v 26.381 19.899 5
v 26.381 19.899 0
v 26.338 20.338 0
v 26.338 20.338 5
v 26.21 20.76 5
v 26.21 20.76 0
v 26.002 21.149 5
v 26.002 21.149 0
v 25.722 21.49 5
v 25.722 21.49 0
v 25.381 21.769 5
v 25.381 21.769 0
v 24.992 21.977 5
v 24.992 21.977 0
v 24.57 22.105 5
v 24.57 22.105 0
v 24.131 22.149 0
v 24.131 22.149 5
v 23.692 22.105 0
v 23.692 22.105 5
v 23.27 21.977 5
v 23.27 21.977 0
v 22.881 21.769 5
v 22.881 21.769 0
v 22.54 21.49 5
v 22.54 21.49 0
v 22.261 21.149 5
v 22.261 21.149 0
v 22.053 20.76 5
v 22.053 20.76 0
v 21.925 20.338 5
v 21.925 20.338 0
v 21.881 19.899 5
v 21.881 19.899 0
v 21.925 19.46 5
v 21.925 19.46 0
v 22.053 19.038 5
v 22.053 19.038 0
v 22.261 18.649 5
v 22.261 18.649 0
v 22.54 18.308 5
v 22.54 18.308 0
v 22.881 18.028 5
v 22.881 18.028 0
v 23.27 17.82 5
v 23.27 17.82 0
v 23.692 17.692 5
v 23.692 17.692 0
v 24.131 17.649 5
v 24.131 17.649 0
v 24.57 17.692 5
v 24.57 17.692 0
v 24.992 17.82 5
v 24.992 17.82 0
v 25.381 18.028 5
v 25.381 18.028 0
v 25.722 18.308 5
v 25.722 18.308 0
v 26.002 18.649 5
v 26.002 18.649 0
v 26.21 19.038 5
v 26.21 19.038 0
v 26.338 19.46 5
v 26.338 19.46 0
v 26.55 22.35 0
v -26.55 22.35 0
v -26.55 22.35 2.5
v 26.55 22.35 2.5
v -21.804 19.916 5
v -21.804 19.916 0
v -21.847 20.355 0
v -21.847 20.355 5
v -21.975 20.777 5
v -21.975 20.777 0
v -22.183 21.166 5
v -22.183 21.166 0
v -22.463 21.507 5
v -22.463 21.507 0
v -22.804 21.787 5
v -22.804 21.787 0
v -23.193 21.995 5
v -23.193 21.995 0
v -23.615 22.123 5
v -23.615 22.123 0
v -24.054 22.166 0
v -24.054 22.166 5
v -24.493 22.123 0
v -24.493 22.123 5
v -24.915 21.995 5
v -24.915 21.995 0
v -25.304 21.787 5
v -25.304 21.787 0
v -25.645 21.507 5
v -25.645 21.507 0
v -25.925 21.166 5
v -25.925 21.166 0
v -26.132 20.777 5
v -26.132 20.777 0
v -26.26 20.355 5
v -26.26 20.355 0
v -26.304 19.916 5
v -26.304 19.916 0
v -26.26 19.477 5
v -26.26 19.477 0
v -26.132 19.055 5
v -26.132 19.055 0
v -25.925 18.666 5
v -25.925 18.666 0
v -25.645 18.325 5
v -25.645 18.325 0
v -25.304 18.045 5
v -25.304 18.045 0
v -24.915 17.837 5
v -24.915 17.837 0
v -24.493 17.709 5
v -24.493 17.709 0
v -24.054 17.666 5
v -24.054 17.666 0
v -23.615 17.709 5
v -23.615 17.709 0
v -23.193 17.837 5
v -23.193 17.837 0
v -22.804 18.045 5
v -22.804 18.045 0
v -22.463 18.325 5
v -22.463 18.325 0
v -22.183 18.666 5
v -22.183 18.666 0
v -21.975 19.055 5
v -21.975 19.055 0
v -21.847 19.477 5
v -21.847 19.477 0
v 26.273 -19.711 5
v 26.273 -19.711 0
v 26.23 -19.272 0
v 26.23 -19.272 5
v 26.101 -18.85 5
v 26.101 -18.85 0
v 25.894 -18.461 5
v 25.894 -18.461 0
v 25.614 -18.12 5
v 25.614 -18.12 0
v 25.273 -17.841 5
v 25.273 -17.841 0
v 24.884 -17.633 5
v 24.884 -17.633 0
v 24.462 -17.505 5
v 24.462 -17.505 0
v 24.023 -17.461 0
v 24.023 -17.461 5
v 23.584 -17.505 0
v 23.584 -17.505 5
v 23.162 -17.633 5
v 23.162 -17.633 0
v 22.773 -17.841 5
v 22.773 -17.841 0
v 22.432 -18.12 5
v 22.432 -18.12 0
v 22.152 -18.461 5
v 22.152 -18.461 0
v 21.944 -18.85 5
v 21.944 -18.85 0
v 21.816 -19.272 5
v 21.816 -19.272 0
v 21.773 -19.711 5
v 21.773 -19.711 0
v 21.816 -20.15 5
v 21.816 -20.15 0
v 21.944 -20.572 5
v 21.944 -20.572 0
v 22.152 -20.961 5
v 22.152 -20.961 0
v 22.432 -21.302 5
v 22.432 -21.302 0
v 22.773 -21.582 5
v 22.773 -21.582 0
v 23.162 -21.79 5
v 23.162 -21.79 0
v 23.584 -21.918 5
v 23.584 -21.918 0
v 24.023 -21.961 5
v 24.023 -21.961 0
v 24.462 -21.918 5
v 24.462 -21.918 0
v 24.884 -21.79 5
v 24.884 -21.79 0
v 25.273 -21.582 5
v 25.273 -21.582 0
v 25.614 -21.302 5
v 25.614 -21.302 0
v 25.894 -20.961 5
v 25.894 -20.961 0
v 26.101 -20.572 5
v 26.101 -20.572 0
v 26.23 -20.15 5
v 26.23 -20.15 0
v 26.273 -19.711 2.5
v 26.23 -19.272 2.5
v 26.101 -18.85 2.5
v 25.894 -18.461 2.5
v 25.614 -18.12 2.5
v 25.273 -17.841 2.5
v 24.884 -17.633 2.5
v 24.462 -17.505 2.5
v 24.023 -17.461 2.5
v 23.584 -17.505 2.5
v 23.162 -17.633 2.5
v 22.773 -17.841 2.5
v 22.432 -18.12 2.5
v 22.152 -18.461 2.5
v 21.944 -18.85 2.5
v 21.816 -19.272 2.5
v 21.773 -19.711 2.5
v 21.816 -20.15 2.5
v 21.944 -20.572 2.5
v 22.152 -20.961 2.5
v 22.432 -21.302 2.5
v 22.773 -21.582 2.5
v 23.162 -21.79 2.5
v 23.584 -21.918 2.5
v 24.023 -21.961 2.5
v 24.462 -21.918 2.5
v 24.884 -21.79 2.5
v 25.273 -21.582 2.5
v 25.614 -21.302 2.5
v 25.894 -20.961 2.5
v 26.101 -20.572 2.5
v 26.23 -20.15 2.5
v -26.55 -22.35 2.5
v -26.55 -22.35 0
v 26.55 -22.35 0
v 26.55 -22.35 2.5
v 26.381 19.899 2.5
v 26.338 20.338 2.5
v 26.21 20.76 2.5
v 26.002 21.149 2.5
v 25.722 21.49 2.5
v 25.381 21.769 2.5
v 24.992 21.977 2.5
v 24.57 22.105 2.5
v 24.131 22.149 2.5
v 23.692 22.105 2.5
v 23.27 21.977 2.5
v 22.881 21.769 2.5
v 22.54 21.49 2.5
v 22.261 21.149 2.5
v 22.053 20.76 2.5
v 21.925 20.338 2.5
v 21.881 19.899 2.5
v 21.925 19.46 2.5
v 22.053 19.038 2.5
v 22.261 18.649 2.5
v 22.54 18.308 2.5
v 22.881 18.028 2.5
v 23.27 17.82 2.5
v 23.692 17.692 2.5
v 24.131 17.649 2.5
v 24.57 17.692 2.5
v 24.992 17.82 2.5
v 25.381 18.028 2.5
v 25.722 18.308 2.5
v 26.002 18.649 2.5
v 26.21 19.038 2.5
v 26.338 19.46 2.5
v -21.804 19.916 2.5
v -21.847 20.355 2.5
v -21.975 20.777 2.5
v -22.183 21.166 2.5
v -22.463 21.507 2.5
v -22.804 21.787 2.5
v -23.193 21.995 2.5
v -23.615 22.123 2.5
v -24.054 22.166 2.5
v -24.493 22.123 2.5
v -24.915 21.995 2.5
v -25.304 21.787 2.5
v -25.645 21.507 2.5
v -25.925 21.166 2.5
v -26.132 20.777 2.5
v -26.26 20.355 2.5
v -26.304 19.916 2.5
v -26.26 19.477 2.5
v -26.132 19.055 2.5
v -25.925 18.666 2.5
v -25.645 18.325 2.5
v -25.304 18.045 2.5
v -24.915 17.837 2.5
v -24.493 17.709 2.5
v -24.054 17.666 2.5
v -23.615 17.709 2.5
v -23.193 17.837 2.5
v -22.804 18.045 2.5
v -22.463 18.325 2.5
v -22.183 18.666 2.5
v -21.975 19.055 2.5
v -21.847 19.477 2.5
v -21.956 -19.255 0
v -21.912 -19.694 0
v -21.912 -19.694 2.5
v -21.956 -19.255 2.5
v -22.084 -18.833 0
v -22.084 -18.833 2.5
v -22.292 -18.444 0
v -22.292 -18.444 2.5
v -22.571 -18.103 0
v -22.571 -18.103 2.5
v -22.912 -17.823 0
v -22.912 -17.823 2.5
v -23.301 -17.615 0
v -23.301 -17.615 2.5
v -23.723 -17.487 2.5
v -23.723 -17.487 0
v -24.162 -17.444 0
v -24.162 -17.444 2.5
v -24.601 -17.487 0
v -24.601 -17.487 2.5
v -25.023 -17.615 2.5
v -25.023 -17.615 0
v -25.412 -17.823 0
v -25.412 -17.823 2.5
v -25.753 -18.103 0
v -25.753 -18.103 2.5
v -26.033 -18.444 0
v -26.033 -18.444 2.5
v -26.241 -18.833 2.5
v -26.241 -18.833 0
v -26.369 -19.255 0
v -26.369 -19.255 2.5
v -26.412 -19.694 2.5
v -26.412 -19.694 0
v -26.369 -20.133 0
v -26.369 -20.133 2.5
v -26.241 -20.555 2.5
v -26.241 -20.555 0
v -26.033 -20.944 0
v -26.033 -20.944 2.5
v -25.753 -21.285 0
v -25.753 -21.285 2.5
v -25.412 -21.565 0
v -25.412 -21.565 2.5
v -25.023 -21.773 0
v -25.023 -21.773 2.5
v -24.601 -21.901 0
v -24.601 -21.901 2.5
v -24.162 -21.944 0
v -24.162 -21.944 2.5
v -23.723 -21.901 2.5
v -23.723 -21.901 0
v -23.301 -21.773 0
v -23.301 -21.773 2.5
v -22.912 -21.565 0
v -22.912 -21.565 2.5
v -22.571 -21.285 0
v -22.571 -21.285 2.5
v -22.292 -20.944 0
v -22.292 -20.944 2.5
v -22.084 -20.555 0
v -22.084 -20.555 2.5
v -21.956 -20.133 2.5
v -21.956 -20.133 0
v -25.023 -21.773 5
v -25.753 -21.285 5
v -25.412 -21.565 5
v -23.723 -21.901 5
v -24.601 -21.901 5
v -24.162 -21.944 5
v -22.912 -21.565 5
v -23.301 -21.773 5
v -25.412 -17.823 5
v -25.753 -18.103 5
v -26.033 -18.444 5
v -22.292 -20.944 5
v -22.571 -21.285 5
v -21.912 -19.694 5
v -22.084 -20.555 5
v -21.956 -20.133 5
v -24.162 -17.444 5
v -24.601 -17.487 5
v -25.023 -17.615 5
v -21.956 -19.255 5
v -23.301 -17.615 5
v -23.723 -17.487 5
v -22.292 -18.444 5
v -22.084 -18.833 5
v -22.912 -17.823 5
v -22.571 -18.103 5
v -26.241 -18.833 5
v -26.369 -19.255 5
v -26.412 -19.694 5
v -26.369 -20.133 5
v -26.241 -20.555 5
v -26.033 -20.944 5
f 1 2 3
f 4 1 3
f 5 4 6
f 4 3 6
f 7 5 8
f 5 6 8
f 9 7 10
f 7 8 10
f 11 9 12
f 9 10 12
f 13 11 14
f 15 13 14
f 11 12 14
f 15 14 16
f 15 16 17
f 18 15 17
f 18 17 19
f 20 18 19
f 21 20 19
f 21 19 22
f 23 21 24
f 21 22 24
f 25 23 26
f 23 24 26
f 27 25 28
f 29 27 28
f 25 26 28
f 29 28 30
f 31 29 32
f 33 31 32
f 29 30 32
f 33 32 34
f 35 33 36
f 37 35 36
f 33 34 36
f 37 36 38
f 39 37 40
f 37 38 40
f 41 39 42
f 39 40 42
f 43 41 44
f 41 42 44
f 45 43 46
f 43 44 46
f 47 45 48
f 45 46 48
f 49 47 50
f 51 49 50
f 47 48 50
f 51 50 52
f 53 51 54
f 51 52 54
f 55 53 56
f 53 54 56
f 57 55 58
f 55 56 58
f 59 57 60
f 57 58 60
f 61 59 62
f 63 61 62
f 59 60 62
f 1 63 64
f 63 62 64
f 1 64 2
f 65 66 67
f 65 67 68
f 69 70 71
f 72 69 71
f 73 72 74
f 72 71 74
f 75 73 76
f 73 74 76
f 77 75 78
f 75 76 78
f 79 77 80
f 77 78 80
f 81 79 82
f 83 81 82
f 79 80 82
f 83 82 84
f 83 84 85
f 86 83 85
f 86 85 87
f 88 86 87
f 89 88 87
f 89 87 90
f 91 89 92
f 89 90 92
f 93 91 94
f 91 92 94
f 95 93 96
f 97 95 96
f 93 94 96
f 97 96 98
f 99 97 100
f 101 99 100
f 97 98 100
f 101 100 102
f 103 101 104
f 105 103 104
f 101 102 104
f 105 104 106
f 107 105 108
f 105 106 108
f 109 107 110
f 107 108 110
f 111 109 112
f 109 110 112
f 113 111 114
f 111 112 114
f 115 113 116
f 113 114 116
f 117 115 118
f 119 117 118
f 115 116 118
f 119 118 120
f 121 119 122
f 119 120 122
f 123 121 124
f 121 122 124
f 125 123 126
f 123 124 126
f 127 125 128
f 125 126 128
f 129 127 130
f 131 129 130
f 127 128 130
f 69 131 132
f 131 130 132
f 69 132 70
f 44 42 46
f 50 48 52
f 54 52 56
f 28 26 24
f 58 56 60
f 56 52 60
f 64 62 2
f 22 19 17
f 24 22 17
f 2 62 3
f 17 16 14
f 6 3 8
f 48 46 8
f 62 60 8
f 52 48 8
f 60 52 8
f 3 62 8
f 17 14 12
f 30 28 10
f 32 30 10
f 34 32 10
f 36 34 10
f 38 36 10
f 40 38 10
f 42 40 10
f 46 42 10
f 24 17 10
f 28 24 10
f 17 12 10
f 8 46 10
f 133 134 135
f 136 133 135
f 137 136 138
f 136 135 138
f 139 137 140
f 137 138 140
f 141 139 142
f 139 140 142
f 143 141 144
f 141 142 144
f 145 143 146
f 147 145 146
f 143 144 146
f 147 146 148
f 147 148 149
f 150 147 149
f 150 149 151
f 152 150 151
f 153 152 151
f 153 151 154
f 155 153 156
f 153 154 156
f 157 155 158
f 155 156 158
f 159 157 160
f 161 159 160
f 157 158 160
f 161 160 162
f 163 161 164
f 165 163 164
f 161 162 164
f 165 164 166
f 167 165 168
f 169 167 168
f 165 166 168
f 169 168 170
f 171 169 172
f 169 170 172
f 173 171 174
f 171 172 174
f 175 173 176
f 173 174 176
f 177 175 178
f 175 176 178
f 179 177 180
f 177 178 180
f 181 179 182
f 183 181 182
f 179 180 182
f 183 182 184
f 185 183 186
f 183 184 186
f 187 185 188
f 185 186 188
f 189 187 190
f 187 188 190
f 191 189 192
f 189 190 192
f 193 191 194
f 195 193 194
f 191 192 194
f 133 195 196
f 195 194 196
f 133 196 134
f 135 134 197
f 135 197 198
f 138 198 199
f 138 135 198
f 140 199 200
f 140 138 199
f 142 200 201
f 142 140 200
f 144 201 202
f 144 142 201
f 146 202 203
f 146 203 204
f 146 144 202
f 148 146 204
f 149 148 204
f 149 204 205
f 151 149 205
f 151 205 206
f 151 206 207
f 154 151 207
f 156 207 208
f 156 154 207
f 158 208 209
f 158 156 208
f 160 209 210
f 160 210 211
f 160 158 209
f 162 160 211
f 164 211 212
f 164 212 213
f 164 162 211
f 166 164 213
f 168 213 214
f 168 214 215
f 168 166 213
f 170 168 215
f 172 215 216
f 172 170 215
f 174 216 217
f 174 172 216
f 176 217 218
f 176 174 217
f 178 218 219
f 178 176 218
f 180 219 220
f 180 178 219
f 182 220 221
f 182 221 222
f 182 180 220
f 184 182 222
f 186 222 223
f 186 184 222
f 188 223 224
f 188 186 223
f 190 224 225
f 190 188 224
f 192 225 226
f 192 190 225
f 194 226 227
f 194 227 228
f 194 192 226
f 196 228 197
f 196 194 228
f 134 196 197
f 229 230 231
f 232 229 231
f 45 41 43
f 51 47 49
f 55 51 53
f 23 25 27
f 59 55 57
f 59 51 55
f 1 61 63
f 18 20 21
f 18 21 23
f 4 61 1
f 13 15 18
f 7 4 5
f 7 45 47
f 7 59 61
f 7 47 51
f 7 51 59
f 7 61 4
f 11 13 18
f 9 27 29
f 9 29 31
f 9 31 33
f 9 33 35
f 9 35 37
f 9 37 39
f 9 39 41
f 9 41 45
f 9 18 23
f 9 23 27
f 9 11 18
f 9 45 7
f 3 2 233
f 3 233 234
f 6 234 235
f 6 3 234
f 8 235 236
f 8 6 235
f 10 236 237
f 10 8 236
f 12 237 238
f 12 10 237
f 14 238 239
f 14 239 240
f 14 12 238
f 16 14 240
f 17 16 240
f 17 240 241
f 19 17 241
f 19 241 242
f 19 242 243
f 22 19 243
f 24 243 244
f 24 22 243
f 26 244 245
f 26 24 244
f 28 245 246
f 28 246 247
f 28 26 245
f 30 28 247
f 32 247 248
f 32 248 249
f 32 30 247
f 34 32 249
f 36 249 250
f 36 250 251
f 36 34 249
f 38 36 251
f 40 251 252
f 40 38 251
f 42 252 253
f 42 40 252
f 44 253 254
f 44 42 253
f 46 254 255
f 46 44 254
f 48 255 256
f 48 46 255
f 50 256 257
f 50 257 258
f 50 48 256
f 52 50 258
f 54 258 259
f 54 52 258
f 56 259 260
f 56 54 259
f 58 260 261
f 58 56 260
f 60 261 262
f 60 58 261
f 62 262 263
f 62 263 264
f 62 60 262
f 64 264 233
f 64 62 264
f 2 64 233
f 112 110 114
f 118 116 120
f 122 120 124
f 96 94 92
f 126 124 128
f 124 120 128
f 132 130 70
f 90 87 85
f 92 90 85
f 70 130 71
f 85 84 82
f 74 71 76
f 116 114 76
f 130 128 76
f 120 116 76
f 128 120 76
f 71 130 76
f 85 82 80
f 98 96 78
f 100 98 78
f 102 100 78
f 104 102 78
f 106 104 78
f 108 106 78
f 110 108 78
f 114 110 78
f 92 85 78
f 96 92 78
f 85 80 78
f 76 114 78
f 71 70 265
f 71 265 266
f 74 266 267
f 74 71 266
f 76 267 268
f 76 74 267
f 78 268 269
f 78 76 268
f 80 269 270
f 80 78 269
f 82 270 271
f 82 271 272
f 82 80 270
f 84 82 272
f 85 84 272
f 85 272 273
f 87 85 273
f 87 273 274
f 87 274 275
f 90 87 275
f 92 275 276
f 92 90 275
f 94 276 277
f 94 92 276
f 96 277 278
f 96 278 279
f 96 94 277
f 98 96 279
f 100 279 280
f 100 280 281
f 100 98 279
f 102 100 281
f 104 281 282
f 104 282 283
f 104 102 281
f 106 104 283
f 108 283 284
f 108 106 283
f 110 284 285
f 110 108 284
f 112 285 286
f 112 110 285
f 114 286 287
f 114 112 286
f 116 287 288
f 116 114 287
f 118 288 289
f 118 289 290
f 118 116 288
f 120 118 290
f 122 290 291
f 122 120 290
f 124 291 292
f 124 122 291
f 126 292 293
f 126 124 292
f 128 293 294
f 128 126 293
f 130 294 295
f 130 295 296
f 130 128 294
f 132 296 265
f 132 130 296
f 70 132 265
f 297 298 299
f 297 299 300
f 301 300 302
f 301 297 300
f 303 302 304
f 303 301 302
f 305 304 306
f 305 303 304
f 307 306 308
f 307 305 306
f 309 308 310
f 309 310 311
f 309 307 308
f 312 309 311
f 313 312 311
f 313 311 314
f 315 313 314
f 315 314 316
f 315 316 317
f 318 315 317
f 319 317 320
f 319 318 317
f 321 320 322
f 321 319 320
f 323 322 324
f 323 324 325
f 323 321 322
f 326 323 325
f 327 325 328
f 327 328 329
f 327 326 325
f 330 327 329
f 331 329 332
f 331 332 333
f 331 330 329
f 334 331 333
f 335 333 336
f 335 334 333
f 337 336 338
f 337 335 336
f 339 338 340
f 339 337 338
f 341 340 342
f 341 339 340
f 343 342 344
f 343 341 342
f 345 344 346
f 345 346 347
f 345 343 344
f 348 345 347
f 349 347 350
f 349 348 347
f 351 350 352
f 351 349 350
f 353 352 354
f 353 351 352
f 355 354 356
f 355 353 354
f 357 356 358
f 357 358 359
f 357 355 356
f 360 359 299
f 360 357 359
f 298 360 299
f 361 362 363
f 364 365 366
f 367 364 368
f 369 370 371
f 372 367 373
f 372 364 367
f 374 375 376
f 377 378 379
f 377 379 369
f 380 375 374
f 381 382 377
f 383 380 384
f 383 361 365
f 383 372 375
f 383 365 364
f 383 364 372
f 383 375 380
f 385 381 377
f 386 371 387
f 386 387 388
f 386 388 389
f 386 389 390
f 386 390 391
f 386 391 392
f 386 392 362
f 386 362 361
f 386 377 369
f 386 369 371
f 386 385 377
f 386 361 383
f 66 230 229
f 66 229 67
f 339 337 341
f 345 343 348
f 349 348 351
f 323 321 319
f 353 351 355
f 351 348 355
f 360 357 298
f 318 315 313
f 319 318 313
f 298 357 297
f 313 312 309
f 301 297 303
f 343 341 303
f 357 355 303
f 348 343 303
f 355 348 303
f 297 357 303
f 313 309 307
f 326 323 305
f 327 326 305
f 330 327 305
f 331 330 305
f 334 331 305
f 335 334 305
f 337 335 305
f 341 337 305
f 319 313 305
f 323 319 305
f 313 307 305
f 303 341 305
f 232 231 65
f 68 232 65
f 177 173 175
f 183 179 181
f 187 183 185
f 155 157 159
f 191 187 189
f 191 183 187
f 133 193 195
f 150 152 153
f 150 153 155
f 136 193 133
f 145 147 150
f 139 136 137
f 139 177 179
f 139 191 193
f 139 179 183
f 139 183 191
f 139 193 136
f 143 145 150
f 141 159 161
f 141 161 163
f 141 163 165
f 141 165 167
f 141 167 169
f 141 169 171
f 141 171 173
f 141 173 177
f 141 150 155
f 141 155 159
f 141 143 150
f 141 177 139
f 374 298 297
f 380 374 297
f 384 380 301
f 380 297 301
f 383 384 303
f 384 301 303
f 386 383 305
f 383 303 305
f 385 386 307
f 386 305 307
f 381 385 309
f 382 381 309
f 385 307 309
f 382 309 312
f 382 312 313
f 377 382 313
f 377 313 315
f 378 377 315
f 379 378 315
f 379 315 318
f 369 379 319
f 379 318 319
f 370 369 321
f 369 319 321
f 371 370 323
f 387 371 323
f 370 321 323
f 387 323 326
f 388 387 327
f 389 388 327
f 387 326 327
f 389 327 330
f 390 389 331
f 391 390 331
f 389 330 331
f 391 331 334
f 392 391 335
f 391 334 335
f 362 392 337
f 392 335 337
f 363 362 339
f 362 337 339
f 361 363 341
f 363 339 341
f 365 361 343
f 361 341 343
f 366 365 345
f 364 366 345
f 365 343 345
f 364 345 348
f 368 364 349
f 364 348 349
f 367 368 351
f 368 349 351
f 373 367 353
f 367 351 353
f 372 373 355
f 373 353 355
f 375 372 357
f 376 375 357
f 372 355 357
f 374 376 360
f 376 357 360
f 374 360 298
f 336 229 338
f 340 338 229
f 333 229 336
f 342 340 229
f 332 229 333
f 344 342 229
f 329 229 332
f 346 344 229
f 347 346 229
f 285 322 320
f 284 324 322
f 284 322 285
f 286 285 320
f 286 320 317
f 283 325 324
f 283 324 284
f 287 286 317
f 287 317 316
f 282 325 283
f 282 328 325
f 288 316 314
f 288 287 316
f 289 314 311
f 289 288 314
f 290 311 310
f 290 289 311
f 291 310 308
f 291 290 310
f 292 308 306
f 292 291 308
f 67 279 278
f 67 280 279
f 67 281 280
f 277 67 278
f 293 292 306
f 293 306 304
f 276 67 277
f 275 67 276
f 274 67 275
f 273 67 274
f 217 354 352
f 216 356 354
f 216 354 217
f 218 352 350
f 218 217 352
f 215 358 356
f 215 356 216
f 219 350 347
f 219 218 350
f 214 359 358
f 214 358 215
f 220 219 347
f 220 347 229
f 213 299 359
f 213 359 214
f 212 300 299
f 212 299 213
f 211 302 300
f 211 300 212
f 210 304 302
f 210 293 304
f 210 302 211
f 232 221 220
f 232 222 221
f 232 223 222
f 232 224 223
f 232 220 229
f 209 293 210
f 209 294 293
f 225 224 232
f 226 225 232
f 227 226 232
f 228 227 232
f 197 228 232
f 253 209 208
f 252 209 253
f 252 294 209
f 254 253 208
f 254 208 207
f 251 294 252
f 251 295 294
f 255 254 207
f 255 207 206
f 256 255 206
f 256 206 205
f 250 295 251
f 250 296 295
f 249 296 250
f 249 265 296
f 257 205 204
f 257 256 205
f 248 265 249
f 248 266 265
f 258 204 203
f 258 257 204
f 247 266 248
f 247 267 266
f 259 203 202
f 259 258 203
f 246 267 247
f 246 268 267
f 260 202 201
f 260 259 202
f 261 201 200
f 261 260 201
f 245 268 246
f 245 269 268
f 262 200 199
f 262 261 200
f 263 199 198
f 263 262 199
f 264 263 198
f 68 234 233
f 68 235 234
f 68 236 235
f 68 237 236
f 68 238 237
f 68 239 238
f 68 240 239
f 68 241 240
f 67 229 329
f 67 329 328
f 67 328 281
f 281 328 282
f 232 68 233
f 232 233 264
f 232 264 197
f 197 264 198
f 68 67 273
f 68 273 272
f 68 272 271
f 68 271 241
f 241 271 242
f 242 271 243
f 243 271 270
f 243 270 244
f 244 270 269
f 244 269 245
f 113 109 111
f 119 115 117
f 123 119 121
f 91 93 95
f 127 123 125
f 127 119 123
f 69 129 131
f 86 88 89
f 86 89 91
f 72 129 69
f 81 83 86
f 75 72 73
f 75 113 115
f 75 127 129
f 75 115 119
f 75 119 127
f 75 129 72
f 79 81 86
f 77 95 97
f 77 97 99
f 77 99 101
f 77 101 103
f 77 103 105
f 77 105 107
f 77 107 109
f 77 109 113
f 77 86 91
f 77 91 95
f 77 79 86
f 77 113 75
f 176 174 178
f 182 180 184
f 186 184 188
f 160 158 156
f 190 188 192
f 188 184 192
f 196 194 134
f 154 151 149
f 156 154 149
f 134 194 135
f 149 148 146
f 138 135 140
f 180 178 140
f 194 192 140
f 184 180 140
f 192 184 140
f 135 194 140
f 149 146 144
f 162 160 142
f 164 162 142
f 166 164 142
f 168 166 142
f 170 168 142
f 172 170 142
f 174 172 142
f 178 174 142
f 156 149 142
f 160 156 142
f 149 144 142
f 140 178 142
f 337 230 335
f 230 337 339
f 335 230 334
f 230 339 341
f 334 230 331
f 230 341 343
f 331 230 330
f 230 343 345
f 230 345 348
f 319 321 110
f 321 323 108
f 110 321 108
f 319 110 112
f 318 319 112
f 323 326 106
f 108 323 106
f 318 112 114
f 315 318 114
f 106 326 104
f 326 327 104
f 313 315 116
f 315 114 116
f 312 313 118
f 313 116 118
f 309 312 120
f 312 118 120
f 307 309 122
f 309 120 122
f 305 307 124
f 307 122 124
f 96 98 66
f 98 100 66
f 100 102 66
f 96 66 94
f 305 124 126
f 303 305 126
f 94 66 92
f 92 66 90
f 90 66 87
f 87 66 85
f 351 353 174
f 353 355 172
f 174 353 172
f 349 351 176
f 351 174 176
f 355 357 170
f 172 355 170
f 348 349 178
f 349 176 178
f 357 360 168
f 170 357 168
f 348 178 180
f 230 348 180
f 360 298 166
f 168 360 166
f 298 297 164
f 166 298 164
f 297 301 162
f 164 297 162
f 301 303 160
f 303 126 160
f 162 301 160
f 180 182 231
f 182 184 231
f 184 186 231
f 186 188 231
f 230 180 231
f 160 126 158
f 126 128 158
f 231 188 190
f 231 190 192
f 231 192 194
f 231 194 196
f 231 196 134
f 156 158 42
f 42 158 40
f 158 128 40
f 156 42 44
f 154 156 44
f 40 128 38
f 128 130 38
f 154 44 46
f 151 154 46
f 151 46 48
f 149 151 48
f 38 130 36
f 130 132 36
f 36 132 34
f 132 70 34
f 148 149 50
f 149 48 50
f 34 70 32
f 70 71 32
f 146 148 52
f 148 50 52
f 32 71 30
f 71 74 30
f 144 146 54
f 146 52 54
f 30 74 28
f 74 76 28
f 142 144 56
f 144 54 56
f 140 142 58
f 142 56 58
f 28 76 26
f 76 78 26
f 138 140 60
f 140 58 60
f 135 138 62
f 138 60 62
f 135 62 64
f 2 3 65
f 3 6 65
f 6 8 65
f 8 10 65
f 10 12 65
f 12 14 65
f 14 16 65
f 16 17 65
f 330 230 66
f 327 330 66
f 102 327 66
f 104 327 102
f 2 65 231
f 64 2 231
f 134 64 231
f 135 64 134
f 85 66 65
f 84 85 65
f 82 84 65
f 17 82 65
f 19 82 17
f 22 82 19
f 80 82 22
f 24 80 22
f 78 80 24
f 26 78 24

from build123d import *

# Parameters (mm, degrees)
F0_R     = 2.25
F1_DEPTH = 5
F0_W     = 53.1
F0_H     = 44.7
F2_DEPTH = 2.5


# Not quite as in the source:
# - the program builds the solid bodies; features that only make, move or delete a surface that nothing else refers to are left out


with BuildPart() as f1:
    # F0 (on Top) → F1 (new body)
    with BuildSketch(Plane.XY):
        with Locations((24.1313669831, 19.8986493051)):
            Circle(F0_R)
    extrude(amount=F1_DEPTH)


with BuildPart() as f1b:
    # F0 (on Top) → F1, piece 2 (new body)
    with BuildSketch(Plane.XY):
        with Locations((-24.0537095815, 19.9159570038)):
            Circle(F0_R)
    extrude(amount=F1_DEPTH)


with BuildPart() as f1c:
    # F0 (on Top) → F1, piece 3 (new body)
    with BuildSketch(Plane.XY):
        with Locations((-24.1623297334, -19.694061164)):
            Circle(F0_R)
    extrude(amount=F1_DEPTH)


with BuildPart() as f1d:
    # F0 (on Top) → F1, piece 4 (new body)
    with BuildSketch(Plane.XY):
        with Locations((24.0227468312, -19.7113688628)):
            Circle(F0_R)
    extrude(amount=F1_DEPTH)


with BuildPart() as f2:
    # F0 (on Top) → F2 (new body)
    with BuildSketch(Plane.XY):
        Rectangle(F0_W, F0_H)
        with Locations((-24.1623297334, -19.694061164)):
            Circle(F0_R, mode=Mode.SUBTRACT)
        with Locations((24.0227468312, -19.7113688628)):
            Circle(F0_R, mode=Mode.SUBTRACT)
        with Locations((-24.0537095815, 19.9159570038)):
            Circle(F0_R, mode=Mode.SUBTRACT)
        with Locations((24.1313669831, 19.8986493051)):
            Circle(F0_R, mode=Mode.SUBTRACT)
    extrude(amount=F2_DEPTH)


solid = Compound([f1.part, f1b.part, f1c.part, f1d.part, f2.part])
